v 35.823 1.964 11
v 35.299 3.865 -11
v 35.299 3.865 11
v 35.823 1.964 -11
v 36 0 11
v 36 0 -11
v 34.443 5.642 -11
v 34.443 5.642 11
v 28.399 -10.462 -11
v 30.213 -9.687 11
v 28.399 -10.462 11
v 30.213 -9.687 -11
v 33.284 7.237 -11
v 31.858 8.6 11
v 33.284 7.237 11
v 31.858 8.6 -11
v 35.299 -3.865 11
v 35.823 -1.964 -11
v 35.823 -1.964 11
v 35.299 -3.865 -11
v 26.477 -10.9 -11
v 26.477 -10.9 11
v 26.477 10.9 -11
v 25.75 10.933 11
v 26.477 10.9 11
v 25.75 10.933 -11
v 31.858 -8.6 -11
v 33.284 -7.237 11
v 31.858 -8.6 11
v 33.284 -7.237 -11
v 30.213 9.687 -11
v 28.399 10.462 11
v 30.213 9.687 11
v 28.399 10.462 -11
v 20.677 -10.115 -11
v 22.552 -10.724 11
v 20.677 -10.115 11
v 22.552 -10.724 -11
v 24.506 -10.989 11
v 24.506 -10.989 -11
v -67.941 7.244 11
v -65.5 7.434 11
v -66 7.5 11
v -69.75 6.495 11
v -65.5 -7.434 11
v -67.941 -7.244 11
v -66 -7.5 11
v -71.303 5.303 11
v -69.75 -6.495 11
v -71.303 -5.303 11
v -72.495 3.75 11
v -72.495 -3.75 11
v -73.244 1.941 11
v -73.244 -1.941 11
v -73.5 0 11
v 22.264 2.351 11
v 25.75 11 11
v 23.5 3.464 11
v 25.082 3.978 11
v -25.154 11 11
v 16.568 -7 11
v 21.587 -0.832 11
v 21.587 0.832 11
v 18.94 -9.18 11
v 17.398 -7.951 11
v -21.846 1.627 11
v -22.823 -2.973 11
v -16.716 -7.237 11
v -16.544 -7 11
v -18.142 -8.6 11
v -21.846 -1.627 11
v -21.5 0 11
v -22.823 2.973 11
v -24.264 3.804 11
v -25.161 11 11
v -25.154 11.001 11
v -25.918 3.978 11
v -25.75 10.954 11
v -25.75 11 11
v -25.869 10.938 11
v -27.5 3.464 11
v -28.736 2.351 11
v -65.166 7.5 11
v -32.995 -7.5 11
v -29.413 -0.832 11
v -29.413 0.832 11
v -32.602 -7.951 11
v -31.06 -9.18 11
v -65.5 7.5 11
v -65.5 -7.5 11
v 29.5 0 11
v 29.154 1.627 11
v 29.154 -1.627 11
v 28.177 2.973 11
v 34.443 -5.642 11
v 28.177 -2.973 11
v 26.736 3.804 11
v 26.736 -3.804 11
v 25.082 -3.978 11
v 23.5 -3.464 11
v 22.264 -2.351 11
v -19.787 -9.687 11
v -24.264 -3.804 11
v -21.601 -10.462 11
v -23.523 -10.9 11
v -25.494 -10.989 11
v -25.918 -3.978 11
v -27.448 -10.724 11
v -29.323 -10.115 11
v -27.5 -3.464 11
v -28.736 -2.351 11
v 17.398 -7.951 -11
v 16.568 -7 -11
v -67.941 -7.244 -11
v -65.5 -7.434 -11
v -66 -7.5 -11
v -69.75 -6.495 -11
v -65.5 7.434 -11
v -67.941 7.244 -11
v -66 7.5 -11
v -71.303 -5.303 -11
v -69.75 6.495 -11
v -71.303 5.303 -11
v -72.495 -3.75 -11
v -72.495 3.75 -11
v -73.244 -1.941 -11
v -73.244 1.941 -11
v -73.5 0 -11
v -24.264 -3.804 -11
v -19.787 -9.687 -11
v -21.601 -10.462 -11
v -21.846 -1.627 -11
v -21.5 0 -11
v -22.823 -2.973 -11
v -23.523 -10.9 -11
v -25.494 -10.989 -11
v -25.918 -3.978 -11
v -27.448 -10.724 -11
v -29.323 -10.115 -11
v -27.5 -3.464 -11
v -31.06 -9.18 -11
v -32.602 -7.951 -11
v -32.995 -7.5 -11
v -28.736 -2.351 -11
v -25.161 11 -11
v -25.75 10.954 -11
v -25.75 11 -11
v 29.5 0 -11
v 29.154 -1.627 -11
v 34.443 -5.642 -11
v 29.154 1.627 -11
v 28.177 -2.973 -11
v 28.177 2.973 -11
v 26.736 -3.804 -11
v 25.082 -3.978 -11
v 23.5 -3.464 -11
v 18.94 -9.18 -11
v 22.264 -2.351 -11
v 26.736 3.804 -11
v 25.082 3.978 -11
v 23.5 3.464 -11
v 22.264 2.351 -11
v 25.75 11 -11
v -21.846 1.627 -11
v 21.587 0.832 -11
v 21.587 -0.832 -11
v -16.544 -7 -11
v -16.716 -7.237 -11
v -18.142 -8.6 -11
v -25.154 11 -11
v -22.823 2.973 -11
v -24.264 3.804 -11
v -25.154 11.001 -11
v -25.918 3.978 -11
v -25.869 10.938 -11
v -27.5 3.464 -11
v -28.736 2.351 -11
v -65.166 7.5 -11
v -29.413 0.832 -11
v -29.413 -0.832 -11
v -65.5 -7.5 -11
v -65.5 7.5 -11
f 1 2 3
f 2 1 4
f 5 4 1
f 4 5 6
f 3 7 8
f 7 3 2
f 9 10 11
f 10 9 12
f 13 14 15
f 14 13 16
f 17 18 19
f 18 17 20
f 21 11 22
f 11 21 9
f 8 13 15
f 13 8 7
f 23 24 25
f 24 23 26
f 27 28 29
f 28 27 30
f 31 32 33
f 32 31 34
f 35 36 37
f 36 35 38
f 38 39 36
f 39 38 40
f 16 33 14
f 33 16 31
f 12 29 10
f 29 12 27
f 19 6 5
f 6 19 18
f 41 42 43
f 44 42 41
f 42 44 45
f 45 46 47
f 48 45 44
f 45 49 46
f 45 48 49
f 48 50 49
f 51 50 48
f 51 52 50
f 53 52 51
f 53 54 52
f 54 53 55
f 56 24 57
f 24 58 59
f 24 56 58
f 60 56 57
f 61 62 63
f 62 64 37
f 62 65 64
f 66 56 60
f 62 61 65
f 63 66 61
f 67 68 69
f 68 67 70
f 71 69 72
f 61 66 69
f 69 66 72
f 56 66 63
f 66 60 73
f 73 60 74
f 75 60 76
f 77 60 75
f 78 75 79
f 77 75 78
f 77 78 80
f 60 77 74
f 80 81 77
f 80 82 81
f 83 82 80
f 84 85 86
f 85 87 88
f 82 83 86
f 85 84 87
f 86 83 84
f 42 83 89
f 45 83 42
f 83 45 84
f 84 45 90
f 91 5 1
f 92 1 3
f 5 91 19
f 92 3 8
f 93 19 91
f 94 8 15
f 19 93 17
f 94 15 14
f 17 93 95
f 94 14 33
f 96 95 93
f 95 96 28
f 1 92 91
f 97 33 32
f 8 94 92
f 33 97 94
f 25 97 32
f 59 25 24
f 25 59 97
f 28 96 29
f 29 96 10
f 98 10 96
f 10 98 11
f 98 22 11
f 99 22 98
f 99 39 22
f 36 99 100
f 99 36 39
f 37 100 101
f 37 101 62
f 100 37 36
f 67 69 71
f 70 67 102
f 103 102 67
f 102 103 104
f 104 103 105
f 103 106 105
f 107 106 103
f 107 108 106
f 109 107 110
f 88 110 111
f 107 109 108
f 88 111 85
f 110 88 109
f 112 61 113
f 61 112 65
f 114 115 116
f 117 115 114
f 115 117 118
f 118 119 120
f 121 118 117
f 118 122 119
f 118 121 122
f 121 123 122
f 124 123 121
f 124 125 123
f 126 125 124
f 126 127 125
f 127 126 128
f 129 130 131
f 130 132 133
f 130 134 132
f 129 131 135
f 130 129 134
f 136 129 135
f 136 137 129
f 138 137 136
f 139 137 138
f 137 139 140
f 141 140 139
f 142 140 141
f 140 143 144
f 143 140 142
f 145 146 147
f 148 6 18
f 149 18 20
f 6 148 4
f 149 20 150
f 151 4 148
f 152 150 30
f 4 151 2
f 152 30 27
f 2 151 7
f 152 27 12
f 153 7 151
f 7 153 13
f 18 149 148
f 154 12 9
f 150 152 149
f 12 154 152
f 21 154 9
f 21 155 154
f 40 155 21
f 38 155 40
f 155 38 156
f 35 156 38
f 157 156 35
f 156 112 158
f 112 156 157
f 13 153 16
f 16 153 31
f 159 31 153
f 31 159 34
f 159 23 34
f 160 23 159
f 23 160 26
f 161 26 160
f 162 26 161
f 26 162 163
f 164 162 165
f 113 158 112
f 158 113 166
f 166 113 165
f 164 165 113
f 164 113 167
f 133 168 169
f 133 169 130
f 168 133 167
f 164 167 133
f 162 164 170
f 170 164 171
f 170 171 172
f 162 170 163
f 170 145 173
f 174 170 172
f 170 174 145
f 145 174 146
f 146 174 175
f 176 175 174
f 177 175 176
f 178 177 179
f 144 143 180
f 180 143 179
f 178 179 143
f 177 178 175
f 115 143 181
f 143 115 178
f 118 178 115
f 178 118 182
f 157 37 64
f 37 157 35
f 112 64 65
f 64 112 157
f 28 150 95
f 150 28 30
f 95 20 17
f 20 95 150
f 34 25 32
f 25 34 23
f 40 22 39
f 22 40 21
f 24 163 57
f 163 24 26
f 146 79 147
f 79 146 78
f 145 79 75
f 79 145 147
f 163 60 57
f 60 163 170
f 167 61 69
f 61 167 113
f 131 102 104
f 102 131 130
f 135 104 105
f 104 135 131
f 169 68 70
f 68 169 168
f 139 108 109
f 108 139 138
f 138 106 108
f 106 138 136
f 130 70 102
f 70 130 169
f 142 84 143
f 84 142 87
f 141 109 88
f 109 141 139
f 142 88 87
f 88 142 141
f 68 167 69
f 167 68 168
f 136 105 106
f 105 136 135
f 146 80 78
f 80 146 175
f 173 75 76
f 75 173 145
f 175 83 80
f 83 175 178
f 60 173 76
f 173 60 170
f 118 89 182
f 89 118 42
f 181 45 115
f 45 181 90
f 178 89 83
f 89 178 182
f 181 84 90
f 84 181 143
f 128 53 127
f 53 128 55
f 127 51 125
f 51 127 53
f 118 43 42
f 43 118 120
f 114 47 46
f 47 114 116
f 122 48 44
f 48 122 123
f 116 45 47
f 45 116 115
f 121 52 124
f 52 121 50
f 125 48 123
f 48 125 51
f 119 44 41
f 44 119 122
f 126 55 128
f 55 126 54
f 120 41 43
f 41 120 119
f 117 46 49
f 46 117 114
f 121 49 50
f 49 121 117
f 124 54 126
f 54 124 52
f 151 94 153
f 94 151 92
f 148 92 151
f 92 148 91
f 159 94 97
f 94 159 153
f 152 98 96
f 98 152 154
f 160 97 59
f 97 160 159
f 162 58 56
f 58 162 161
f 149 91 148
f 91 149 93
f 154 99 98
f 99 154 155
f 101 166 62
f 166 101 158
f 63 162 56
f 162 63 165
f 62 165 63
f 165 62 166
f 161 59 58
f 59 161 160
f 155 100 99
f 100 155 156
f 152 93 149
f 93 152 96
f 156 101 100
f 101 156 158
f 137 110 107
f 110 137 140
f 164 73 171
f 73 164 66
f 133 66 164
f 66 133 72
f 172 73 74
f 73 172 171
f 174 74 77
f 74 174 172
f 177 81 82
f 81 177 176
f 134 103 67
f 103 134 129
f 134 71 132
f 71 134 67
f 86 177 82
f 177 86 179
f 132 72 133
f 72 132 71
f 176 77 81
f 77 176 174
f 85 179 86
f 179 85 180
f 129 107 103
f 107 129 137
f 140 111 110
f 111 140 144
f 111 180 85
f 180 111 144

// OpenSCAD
/**
 * @file apriliaRxChainSlide.scad
 *
 * @version 1.0
 *
 * @author Calum Judd Anderson
 *
 * @brief Chain slide for the Aprilia ETX/MX/RX/SX 125 1990-2011.
 */
$fa = 0.01;
 
INTERFERENCE_FIT = 0.001;
SLIDE_FIT = 0.05;

CHAIN_SLIDE_DEPTH = 22;

/**
 * @brief Creates a through hole for the bolt to go through.
 */
module chainSlideThroughHole() {
     CHAIN_SLIDE_DEPTH = 22;
     boltStayRadius = 4;
    
     cylinder(CHAIN_SLIDE_DEPTH + SLIDE_FIT, boltStayRadius, boltStayRadius, center=true, $fn=15);
}

/**
 * @brief Creates the chain slide bolt through holes.
 */
module chainSlideThroughHoles() {
    holeDistance = 51;
    holeSpacing = holeDistance/2;
    
    union() {
        /* Right Hole */
        translate([holeSpacing, 0, 0])
            chainSlideThroughHole();
        
        /* Left Hole */
        translate([-holeSpacing, 0, 0])
            chainSlideThroughHole();
     }
}

/**
 */
module chainSlideMainBody() {
    mainBodyWidth = 51.5;
    
    endTailWidth = 33;
    endCylinderRadius = 7.5;
    
    union() {
        /* Right End */
        translate([25, 0, 0])
            cylinder(CHAIN_SLIDE_DEPTH, CHAIN_SLIDE_DEPTH/2, CHAIN_SLIDE_DEPTH/2, center=true);

        /* Main Body */
        translate([0, 2, 0])
            cube([mainBodyWidth, 18, CHAIN_SLIDE_DEPTH], center=true);
        
        /* Left End */
        translate([-25, 0, 0])
            cylinder(CHAIN_SLIDE_DEPTH, CHAIN_SLIDE_DEPTH/2, CHAIN_SLIDE_DEPTH/2, center=true);
        
        /* Tail End */
        translate([-45, 5.5, 0])
            rotate([0, 0, 5])
            cube([endTailWidth + 7.5, endCylinderRadius, CHAIN_SLIDE_DEPTH], center=true);
        
        translate([-49, 0, 0])
            cube([endTailWidth, endCylinderRadius*2, CHAIN_SLIDE_DEPTH], center=true);
        
        translate([-25 - 41, 0, 0])
            cylinder(CHAIN_SLIDE_DEPTH, endCylinderRadius, endCylinderRadius, center=true);
    }
}
/**
 * @brief Chain slide.
 */
module chainSlide() {
    difference() {
        chainSlideMainBody();
        chainSlideThroughHoles();     
    }
}
 
chainSlide();
